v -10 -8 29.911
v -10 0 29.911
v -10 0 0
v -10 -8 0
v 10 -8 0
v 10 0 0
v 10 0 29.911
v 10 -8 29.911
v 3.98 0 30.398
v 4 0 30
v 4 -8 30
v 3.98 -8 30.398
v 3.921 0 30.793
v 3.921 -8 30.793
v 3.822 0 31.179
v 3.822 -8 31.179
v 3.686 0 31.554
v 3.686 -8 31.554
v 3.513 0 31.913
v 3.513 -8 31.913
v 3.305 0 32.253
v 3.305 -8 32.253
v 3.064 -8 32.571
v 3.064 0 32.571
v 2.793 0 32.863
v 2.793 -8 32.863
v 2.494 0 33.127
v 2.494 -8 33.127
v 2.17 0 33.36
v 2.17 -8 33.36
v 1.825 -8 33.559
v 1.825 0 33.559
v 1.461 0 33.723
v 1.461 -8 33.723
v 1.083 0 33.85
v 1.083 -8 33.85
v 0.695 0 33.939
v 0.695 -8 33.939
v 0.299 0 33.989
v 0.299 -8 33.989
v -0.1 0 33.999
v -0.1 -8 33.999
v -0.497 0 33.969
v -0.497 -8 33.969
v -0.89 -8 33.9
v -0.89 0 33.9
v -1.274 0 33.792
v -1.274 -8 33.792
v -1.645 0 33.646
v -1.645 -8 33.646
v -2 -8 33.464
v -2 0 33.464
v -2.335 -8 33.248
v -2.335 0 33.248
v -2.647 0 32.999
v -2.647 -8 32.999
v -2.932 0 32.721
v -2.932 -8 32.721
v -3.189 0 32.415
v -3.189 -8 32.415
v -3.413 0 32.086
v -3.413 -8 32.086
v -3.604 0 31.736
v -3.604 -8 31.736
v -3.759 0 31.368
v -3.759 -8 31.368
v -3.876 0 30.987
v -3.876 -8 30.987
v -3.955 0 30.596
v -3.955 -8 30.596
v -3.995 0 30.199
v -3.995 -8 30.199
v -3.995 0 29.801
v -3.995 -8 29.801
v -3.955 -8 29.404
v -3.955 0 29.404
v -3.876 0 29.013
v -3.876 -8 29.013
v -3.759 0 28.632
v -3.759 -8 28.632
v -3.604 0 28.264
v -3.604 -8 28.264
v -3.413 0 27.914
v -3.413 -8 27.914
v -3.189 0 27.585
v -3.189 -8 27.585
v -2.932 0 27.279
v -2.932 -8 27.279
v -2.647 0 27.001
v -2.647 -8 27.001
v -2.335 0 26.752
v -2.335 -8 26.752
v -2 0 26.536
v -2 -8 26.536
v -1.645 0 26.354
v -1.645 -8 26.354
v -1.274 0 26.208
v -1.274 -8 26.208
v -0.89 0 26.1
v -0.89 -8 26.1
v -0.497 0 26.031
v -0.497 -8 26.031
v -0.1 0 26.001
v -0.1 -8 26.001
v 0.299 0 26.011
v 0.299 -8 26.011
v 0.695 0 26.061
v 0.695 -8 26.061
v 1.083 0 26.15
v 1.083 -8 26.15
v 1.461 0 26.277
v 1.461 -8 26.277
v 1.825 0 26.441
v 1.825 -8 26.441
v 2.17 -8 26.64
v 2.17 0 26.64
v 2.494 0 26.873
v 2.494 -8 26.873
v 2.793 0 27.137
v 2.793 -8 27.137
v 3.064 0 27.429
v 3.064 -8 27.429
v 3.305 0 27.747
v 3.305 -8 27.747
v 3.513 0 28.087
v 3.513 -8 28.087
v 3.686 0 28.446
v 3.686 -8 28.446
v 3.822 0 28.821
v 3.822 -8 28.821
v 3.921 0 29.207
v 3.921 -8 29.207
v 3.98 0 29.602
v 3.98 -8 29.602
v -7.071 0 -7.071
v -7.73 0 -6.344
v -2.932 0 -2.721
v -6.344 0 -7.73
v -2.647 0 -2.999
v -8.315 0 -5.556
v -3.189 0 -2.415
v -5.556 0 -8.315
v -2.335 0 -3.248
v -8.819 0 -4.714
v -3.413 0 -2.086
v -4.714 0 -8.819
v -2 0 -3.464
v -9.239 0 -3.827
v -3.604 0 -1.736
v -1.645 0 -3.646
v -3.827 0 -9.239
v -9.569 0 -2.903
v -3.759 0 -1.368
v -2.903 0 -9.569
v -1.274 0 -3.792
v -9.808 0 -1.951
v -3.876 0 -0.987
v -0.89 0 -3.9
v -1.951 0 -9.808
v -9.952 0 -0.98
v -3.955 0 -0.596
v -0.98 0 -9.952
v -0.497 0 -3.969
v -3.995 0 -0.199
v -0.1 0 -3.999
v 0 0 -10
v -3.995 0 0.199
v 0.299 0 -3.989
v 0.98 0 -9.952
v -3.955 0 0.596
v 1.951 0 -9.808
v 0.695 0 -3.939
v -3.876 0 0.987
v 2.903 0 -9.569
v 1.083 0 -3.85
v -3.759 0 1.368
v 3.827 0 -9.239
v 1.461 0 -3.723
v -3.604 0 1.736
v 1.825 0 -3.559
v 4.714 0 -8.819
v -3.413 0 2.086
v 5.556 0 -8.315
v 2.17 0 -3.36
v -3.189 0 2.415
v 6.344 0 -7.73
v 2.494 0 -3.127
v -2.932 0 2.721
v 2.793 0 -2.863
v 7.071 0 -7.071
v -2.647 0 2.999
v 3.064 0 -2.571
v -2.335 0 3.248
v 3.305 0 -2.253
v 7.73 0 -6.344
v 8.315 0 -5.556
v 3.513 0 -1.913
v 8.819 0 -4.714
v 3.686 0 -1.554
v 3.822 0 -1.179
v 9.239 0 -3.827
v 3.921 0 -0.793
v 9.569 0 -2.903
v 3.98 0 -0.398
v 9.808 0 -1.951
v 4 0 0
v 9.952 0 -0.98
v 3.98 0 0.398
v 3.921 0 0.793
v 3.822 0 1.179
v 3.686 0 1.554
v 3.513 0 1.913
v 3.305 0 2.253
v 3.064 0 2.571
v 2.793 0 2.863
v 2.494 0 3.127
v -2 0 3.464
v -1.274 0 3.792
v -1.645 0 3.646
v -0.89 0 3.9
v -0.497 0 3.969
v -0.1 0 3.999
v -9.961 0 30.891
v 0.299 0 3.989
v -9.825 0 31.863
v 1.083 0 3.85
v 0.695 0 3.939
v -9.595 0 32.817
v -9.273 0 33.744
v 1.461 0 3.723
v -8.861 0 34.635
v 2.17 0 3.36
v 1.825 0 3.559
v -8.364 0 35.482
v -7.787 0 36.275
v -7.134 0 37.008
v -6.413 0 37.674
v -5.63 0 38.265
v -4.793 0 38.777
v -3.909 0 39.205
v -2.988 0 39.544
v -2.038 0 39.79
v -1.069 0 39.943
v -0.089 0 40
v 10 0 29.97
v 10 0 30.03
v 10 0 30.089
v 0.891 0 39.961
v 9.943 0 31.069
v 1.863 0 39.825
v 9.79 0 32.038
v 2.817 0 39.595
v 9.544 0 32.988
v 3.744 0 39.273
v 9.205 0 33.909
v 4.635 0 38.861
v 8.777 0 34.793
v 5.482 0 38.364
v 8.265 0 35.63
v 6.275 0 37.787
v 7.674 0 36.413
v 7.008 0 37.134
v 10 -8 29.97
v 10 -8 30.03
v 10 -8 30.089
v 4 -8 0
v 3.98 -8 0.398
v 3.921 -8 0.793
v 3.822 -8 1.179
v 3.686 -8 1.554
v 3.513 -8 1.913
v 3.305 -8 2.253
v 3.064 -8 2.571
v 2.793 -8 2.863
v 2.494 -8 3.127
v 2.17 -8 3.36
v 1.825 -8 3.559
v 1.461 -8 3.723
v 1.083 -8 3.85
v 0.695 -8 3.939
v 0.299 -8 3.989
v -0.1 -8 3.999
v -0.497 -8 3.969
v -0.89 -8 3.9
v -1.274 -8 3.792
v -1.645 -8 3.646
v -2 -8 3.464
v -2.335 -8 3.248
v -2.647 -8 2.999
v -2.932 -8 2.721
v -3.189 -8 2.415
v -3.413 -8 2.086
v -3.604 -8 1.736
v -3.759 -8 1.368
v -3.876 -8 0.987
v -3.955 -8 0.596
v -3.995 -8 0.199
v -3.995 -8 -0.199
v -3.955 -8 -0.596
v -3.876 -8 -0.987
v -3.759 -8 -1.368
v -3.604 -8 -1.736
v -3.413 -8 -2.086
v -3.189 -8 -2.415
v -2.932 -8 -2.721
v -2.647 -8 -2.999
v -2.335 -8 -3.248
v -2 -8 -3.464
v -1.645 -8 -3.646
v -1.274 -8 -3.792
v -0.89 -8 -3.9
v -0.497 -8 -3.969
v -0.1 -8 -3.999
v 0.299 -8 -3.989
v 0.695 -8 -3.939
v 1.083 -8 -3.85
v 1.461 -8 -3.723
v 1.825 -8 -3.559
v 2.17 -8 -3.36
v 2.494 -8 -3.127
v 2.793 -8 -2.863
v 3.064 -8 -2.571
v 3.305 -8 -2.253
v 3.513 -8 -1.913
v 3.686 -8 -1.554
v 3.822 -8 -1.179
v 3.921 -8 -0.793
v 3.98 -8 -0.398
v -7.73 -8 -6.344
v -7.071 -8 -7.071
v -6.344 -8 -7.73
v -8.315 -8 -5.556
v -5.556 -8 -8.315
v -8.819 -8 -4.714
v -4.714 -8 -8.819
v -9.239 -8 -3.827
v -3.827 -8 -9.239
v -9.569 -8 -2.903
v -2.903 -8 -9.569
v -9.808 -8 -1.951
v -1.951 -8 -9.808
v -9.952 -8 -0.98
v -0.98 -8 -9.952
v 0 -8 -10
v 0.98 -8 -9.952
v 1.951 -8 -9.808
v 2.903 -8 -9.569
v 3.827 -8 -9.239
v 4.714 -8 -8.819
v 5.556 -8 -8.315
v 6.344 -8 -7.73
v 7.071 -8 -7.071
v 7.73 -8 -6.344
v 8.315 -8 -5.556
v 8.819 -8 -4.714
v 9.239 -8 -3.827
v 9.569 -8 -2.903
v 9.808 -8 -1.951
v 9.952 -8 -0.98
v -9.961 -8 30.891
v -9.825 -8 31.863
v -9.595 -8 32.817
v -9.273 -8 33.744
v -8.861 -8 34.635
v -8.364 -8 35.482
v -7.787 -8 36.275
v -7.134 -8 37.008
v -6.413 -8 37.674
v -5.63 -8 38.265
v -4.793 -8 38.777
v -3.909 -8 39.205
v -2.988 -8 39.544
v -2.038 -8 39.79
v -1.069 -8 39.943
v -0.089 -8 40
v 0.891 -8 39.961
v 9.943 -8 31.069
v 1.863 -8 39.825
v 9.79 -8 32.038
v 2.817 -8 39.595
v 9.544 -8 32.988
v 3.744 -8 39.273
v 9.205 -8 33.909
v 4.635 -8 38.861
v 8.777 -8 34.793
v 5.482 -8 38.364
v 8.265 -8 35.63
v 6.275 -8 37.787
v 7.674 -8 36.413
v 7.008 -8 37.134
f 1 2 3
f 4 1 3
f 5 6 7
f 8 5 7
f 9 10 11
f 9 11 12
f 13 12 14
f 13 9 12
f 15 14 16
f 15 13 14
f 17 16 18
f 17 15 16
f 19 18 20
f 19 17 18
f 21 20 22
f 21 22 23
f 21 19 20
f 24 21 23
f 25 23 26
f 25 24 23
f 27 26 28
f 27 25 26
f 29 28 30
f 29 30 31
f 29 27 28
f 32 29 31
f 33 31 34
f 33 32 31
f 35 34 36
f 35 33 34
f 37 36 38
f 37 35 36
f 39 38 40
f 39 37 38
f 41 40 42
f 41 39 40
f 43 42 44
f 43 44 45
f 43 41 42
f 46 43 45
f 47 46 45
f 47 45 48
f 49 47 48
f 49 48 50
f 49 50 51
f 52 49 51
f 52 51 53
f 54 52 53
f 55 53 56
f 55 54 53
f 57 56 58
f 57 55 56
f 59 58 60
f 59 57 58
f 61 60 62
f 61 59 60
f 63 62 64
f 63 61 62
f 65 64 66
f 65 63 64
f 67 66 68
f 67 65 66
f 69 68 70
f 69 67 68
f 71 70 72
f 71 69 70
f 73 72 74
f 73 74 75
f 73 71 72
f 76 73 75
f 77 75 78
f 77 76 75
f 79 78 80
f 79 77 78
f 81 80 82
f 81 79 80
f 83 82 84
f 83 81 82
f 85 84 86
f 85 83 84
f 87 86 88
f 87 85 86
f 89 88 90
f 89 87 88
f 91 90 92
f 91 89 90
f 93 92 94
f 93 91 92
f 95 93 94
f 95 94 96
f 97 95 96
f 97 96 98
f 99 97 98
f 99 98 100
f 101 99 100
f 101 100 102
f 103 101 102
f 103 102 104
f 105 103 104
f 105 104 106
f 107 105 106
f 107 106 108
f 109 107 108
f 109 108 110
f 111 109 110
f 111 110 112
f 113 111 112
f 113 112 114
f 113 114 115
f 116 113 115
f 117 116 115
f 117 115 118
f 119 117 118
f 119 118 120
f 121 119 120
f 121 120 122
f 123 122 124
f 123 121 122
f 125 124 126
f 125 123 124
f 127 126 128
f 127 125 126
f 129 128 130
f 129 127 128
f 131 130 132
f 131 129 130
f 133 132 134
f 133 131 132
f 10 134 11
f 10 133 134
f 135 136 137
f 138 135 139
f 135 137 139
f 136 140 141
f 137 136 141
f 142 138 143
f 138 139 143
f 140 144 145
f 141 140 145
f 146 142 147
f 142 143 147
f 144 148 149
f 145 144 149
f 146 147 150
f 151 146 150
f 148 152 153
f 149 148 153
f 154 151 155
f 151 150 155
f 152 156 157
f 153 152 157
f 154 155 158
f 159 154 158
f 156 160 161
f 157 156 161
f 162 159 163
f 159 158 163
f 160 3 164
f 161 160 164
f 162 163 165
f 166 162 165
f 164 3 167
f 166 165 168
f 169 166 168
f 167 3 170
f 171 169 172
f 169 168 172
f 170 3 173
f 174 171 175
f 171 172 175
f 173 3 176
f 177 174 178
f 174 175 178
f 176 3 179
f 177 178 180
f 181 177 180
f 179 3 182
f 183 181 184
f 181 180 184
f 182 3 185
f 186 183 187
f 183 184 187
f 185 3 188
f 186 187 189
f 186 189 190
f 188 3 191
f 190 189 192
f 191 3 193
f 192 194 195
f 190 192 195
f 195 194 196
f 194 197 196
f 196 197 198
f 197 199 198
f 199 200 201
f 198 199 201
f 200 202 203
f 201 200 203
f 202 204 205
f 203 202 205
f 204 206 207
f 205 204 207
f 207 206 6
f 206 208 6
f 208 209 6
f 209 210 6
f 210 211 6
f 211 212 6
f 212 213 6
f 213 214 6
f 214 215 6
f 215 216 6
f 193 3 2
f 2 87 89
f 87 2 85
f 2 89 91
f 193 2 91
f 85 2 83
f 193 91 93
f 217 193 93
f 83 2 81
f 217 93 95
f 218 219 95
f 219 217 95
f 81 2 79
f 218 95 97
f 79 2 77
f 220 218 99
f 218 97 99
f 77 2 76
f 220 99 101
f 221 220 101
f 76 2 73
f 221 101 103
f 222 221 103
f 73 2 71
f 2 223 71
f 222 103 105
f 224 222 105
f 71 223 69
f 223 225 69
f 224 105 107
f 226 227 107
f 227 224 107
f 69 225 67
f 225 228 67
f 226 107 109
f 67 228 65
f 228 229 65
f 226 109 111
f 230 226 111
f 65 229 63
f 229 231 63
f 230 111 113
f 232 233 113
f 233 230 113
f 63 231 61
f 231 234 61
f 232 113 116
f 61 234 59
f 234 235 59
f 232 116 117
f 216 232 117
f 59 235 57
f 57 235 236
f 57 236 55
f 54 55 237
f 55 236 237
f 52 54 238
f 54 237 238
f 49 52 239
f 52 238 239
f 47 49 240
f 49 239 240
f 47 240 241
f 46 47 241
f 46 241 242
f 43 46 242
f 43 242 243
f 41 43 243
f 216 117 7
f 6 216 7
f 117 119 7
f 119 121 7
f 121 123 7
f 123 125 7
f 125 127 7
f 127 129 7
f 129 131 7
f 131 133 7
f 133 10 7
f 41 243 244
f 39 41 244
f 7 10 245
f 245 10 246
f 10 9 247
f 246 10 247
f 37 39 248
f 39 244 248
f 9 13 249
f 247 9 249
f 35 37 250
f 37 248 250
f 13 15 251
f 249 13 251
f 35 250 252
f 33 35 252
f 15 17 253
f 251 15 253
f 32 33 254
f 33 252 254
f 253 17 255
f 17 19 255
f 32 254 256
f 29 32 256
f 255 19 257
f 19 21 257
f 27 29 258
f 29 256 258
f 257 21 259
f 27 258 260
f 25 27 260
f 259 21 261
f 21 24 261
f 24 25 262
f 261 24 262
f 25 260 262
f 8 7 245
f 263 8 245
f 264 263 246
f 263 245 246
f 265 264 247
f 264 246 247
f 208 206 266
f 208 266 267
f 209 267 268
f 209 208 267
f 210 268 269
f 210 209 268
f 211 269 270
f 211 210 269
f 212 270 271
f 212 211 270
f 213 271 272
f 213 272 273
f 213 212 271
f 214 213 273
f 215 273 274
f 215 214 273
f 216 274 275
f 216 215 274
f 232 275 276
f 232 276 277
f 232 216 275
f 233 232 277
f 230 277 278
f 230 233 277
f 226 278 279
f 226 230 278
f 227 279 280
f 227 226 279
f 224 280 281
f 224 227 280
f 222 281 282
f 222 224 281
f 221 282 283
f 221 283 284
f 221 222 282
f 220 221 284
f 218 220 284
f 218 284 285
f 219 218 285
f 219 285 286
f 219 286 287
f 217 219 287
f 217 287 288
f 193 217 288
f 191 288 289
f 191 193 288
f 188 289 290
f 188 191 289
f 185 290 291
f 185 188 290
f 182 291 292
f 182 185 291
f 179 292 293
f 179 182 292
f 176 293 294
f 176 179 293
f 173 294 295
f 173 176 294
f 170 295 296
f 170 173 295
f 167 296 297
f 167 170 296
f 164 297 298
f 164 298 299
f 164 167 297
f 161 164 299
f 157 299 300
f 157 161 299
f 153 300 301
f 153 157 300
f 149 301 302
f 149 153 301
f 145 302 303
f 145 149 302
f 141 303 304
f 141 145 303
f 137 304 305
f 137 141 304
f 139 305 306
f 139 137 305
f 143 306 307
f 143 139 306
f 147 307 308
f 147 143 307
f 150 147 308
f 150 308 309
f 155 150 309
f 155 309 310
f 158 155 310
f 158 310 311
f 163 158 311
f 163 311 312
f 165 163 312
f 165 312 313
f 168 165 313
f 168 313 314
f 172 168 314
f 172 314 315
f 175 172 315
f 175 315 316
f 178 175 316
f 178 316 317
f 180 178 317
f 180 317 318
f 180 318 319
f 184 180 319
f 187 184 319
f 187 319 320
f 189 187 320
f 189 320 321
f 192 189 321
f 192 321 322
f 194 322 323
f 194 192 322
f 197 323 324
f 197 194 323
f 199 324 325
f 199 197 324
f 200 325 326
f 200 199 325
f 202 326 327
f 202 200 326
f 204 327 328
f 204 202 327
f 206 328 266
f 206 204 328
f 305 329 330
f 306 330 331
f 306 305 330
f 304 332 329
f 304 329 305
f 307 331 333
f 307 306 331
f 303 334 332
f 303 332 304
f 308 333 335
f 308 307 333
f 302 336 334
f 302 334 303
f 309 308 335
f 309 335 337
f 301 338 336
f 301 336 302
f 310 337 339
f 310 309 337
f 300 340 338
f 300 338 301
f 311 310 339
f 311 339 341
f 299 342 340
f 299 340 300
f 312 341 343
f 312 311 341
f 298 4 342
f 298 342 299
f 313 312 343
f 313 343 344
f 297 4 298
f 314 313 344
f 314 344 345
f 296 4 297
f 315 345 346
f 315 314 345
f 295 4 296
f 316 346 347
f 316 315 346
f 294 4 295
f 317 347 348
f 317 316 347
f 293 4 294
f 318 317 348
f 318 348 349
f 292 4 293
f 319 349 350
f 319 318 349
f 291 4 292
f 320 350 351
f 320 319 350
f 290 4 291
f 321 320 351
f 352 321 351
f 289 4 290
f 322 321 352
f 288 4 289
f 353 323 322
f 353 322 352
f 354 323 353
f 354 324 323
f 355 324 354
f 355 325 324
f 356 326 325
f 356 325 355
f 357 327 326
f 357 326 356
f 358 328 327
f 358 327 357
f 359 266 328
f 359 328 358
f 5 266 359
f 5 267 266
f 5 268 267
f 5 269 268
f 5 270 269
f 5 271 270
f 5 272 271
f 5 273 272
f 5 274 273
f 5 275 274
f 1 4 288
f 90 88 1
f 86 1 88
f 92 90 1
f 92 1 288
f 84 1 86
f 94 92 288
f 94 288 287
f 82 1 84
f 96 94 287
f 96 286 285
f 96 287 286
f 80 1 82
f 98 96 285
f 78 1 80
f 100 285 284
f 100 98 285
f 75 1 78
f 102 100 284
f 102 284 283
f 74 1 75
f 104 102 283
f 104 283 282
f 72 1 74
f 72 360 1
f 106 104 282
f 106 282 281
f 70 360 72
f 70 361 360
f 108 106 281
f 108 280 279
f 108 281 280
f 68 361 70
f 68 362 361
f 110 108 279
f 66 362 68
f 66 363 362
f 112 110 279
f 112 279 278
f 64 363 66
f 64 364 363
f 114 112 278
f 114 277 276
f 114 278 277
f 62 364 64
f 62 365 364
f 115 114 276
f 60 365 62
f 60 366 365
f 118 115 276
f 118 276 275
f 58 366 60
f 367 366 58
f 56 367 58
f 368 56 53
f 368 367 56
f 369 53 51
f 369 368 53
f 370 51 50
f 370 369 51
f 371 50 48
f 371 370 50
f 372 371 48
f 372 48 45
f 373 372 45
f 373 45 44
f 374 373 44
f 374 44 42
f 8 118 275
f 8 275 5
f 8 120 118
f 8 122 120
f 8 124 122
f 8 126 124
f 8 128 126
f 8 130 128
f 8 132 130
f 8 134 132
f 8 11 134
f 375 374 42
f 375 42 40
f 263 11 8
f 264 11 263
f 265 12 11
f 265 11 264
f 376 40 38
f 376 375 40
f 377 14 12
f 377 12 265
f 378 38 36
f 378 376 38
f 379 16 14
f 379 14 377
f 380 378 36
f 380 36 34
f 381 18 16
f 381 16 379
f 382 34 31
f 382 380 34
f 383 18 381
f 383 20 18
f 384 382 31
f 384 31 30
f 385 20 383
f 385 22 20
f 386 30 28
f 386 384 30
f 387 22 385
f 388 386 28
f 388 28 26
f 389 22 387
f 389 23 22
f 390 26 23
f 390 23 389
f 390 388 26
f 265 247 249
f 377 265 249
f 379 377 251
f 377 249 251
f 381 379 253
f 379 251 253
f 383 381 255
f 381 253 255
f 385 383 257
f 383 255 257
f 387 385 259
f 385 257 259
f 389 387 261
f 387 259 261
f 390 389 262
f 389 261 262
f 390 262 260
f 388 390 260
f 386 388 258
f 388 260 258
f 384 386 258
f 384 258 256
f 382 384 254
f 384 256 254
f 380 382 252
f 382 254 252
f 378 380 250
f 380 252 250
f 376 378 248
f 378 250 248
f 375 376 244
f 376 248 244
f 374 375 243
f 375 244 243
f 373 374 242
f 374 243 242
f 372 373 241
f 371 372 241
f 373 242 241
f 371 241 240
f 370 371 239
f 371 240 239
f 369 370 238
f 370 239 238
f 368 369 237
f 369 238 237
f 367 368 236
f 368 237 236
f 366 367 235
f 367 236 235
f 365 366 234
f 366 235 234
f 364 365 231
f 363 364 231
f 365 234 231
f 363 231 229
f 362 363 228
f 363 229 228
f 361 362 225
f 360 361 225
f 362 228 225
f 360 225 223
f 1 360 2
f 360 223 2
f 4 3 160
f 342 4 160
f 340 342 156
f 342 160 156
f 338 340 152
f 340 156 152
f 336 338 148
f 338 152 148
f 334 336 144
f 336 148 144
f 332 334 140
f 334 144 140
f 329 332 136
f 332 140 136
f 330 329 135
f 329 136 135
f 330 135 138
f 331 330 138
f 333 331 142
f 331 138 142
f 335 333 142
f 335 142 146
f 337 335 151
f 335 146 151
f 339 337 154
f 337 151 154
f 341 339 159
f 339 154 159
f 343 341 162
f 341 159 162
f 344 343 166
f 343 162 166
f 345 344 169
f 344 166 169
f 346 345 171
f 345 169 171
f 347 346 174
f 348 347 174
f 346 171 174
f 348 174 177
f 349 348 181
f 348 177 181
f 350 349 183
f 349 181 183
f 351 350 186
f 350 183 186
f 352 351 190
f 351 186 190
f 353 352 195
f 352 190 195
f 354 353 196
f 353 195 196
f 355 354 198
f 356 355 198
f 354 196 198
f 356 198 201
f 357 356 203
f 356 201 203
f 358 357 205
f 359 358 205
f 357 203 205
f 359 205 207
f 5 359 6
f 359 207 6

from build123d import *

# Parameters (mm, degrees)
F0_R     = 4
F1_DEPTH = 8


with BuildPart() as f1:
    # F0 (on Front) → F1 (new body)
    with BuildSketch(Plane.XZ):
        with BuildLine():
            Line((-10, 29.910809), (-10, 0))
            ThreePointArc((-10, 0), (0, -10), (10, 0))
            Line((10, 0), (10, 29.910809))
            Line((10, 29.910809), (10, 30.089191))
            ThreePointArc((10, 30.089191), (-0.089191, 40), (-10, 29.910809))
        make_face()
        Circle(F0_R, mode=Mode.SUBTRACT)
        with Locations((0, 30)):
            Circle(F0_R, mode=Mode.SUBTRACT)
        with BuildLine():
            Line((10, 30.089191), (10, 29.910809))
            ThreePointArc((10, 29.910809), (10.000398, 30), (10, 30.089191))
        make_face()
    extrude(amount=F1_DEPTH)


solid = f1.part
